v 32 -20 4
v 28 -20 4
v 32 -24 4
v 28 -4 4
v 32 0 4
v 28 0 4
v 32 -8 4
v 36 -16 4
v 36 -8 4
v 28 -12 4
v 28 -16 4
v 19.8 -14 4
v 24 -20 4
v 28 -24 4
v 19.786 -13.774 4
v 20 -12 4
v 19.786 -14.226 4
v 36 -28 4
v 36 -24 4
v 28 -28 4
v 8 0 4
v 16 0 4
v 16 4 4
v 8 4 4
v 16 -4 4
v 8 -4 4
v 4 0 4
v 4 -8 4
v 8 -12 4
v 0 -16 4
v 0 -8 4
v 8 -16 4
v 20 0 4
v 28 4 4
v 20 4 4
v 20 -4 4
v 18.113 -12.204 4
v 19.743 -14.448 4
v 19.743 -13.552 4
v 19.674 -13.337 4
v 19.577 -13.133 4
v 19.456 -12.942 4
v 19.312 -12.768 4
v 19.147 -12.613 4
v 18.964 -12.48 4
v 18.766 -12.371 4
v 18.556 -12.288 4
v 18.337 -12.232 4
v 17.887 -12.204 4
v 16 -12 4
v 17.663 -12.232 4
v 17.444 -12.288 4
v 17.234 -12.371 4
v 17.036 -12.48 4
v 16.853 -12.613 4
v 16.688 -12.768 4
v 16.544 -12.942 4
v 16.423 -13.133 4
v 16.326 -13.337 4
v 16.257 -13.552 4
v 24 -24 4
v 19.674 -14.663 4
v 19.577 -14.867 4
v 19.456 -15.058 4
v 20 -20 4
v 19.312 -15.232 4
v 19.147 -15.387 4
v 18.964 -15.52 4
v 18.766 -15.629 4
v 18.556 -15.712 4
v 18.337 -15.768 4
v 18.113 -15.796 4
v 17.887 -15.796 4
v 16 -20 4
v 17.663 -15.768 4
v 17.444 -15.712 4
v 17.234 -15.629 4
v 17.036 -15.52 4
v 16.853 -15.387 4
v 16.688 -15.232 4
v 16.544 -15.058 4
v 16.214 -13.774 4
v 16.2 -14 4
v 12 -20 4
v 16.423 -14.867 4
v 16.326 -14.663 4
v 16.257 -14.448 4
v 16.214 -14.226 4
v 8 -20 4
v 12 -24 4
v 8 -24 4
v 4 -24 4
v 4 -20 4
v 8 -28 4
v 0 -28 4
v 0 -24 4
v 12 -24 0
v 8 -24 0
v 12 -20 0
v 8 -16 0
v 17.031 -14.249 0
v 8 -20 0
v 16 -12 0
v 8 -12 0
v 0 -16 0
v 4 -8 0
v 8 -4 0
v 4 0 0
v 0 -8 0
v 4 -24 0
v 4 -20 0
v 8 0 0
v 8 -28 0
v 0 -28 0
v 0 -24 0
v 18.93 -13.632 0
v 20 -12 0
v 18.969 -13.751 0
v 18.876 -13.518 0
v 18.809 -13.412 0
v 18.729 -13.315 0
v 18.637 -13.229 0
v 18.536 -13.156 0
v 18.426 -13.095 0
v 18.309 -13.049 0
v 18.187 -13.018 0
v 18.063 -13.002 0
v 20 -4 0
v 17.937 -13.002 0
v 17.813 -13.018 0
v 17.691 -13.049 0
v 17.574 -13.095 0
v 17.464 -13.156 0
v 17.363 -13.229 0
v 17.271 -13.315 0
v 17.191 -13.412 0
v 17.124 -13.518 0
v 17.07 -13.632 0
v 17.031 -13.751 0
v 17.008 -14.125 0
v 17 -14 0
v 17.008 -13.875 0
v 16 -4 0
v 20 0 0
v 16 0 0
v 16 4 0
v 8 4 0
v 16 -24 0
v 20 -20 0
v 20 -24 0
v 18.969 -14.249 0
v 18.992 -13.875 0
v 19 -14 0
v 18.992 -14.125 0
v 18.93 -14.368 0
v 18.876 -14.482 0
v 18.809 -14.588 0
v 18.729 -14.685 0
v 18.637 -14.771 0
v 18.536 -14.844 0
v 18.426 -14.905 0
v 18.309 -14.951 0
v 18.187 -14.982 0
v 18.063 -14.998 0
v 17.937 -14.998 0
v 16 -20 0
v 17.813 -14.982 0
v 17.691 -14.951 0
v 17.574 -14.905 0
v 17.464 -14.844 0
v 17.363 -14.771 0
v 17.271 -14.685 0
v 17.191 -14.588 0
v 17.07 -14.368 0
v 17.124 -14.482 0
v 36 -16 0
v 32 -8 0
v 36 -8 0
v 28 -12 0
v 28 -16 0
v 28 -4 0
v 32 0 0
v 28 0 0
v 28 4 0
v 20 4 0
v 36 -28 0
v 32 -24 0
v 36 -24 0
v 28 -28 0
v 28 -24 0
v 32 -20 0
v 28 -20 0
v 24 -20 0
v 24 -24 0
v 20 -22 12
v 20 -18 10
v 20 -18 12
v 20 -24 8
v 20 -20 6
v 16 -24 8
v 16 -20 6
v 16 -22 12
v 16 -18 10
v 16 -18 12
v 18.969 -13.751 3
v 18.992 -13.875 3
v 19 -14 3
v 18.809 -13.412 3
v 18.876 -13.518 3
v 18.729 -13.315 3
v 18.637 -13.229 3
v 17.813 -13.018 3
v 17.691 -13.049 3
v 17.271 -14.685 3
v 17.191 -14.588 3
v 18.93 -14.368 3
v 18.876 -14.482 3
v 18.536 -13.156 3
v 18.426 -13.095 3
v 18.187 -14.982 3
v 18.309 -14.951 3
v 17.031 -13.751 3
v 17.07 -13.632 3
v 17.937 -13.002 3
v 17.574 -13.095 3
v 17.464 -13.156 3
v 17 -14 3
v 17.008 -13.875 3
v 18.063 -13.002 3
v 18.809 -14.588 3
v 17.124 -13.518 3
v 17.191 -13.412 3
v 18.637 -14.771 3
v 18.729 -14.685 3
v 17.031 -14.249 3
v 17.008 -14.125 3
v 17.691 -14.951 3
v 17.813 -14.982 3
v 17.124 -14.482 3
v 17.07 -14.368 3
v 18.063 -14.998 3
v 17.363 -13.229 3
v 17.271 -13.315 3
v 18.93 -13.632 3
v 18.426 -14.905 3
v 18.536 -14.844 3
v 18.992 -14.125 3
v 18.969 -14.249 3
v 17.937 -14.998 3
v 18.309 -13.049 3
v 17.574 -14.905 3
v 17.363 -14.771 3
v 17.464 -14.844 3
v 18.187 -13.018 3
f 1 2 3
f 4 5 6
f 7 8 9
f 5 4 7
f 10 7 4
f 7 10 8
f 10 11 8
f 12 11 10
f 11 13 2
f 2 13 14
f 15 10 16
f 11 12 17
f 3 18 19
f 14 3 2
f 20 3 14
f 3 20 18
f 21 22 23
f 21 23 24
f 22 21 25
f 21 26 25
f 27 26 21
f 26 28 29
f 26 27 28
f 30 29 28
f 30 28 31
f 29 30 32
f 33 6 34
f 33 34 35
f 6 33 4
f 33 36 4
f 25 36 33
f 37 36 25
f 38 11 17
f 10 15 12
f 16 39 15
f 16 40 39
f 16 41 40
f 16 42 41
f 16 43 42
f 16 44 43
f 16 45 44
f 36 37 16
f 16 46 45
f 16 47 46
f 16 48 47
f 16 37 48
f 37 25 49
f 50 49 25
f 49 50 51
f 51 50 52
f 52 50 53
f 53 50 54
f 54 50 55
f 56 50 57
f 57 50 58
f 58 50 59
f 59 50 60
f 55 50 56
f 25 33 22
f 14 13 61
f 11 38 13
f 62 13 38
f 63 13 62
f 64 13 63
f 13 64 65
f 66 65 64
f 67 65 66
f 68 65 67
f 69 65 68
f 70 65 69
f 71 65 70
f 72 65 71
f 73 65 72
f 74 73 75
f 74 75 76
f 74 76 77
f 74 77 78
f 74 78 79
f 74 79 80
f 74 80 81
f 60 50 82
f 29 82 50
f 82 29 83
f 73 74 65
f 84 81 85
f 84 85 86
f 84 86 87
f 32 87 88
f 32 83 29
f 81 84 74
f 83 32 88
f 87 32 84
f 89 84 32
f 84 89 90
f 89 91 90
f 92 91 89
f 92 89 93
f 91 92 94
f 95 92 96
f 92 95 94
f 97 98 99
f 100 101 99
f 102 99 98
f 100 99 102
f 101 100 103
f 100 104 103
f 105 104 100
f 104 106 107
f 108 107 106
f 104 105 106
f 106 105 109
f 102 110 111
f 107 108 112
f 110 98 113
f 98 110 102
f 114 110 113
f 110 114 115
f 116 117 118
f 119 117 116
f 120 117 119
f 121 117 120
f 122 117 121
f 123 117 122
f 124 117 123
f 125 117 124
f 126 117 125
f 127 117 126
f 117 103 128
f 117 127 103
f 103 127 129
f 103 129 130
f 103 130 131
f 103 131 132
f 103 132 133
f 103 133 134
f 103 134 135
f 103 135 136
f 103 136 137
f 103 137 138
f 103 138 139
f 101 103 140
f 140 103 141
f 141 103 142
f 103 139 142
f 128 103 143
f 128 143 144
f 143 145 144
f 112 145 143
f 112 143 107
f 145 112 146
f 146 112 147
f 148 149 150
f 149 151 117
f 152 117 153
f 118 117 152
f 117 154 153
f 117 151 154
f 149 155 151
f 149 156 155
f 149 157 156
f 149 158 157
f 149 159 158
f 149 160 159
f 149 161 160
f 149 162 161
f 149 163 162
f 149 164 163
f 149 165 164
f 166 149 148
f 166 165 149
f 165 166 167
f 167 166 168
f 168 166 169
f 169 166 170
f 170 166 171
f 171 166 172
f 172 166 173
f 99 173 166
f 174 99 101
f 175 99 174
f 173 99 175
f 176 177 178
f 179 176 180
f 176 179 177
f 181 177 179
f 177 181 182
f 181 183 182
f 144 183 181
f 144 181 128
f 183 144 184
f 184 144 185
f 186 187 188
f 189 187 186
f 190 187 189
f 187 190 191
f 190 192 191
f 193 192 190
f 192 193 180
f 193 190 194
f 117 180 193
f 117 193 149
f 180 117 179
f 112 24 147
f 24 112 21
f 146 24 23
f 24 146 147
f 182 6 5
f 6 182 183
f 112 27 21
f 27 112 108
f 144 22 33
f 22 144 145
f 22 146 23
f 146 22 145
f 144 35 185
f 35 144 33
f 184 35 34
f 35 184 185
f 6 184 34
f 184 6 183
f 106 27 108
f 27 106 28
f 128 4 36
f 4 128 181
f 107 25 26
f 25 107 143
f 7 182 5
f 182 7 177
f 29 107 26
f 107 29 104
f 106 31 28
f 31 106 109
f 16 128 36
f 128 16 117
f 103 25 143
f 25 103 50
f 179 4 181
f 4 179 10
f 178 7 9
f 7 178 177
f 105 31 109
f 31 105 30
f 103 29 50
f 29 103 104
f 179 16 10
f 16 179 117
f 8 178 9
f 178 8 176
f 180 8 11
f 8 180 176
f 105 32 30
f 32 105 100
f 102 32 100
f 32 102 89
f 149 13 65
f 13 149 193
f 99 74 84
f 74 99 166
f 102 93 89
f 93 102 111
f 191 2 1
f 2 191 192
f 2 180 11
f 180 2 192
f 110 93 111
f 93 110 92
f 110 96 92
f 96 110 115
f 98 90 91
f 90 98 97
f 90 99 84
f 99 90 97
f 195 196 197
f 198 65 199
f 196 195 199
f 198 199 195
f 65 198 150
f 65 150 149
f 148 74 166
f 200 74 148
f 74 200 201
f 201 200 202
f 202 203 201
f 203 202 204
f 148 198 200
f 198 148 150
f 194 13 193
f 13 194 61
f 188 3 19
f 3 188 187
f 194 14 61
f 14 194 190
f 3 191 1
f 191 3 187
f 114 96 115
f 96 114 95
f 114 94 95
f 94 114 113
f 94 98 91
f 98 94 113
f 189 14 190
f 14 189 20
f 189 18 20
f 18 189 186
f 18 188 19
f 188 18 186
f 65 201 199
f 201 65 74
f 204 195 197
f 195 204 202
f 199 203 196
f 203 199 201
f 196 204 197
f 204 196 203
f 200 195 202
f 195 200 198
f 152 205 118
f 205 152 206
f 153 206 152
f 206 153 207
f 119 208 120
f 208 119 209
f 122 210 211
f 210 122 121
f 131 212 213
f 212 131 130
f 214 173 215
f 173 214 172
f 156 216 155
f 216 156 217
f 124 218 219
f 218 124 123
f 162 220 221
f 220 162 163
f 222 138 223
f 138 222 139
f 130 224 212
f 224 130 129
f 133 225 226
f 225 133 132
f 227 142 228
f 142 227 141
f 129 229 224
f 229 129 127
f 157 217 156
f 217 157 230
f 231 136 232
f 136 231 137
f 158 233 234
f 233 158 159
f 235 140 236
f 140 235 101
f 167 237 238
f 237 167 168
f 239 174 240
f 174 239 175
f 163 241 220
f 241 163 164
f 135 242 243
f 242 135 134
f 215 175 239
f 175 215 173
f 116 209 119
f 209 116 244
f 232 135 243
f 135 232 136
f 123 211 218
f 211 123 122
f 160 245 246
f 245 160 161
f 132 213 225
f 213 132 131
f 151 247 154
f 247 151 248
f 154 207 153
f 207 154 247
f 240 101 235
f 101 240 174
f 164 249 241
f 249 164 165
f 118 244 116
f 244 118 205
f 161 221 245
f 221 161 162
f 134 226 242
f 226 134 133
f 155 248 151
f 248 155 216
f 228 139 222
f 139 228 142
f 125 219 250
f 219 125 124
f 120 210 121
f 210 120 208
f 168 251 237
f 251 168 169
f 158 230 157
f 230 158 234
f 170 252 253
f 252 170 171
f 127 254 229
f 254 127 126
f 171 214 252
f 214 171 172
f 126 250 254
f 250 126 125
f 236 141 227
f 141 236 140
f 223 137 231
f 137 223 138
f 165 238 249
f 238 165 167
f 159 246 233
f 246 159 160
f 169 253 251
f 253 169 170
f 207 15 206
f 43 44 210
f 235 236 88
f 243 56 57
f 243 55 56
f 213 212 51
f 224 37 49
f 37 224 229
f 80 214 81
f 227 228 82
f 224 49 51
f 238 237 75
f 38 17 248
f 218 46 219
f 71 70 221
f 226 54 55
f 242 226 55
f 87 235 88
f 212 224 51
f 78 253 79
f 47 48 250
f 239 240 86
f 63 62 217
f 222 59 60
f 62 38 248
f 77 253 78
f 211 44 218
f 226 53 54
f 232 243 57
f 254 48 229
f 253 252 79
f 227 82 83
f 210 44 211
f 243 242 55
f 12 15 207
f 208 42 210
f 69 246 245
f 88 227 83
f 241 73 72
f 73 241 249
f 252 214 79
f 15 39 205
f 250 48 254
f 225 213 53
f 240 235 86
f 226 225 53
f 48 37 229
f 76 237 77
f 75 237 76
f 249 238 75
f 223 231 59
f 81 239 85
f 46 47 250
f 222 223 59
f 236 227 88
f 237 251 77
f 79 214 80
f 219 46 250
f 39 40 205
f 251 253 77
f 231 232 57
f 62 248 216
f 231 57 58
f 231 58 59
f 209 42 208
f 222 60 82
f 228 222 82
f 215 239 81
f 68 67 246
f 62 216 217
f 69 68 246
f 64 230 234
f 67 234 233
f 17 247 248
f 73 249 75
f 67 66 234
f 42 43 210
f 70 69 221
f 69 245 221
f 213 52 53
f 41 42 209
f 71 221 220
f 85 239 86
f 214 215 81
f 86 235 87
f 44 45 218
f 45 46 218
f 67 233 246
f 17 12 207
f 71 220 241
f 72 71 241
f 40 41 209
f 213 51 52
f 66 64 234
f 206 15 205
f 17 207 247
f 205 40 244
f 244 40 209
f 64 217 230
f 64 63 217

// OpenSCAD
// [FL_INDEX: keywords="openscad, 3d_parametric, space_invader_hook, csg_solid" | COT="Parametric OpenSCAD design from 3DCodeverse"]
// Title: space invader hook

/* ********************************************************************
 * Space Invader Hooks
 * 
 * Generate your own cloth hooks. Tweak parameters, create your own
 * hooks or use the predefined modules.
 *
 * ******************************************************************** */

// preview[view:south, tilt:top]

// ------------------------------------------------------------------
// --- parameter ----------------------------------------------------
// ------------------------------------------------------------------

/* [Global] */



/* [Basic] */

// choose a space invader
spaceInvader = 5; // [1,2,3,4,5,6,7,8,9,10]

// pixel size
edgeLength = 4;

// thickness of the hook
strength = 4;

// radius of the hole
holeRadius = 1.0;

// adjust the strength of the connections of otherwise unconnected pixel
pixel_connection_strength = 0.4;


/* [Advanced] */

// resolution
$fn=50;

// make a hole or not
make_hole = "yes"; // [yes,no]

// make a hook or just the base space invader
make_hook = "yes"; // [yes,no]

// use to avoid loonely pixel
// minkowski_factor=10;



/* [Hidden] */

// ------------------------------------------------------------------
// --- space invader versions ---------------------------------------
// --- a vector of 2d coordinates; hole and hook position -----------
// ------------------------------------------------------------------

// space invader 1 parameter
si_1=[[0,0,1,0,1,0,0],[0,1,1,1,1,1,0],[0,1,0,1,0,1,0],[1,1,1,1,1,1,1],[1,0,1,0,1,0,1],[1,0,0,0,0,0,1]];
si_1_hole=[3,2];
si_1_hook=[3,4];

// space invader 2 parameter
si_2=[[0,0,1,0,1,0,0],[0,1,1,1,1,1,0],[0,1,0,1,0,1,0],[1,1,1,1,1,1,1],[1,0,1,1,1,0,1],[1,0,0,1,0,0,1]];
si_2_hole=[3,3];
si_2_hook=[3,5];

// space invader 3 parameter
si_3=[[0,0,1,0,1,0,0],[0,1,1,1,1,1,0],[0,1,0,1,0,1,0],[1,1,1,1,1,1,1],[1,0,1,1,1,0,1],[1,0,0,1,0,0,1],[0,0,0,1,0,0,0]];
si_3_hole=[3,3];
si_3_hook=[3,6];

// space invader 5 parameter
si_4=[[0,0,1,0,1,0,0],[0,1,1,1,1,1,0],[0,1,0,1,0,1,0],[1,1,1,1,1,1,1],[1,0,1,1,1,0,1],[1,0,0,1,0,0,1],[1,1,0,1,0,1,1]];
si_4_hole=[3,3];
si_4_hook=[3,6];

// space invader 5 parameter
si_5=[[0,0,1,1,0,1,1,0,0],[0,1,1,1,1,1,1,1,0],[0,1,0,0,1,0,0,1,0],[1,1,0,0,1,0,0,1,1],[1,1,1,1,1,1,1,1,1],[0,0,1,1,1,1,1,0,0],[0,1,1,0,1,0,1,1,0],[1,1,0,0,0,0,0,1,1]];
si_5_hole=[4,4];
si_5_hook=[4,6];

// space invader 6 parameter
si_6=[[0,0,1,0,0,0,0,0,1,0,0],[0,0,0,1,0,0,0,1,0,0,0],[0,0,1,1,1,1,1,1,1,0,0],[0,1,1,0,1,1,1,0,1,1,0],[1,1,1,1,1,1,1,1,1,1,1],[1,0,1,1,1,1,1,1,1,0,1],[1,0,1,0,0,0,0,0,1,0,1],[0,0,0,1,1,0,1,1,0,0,0]];
si_6_hole=[5,3];
si_6_hook=[5,5];
si_6_cons=[[0,0,2,0,0,0,0,0,0,0,0],[0,0,0,0,0,0,0,1,0,0,0],[0,0,0,0,0,0,0,0,0,0,0],[0,0,0,0,0,0,0,0,0,0,0],[0,0,0,0,0,0,0,0,0,0,0],[0,0,0,0,0,0,0,0,0,0,0],[0,0,2,0,0,0,0,0,0,0,0],[0,0,0,0,0,0,0,1,0,0,0]];

// space invader 7 parameter
si_7=[[0,0,0,1,1,0,0,0],[0,0,1,1,1,1,0,0],[0,1,1,1,1,1,1,0],[1,1,0,1,1,0,1,1],[1,1,1,1,1,1,1,1],[0,1,0,1,1,0,1,0],[1,0,0,0,0,0,0,1],[0,1,0,0,0,0,1,0]];
si_7_hole=[3.5,3];
si_7_hook=[3.5,5];
si_7_cons=[[0,0,0,0,0,0,0,0],[0,0,0,0,0,0,0,0],[0,0,0,0,0,0,0,0],[0,0,0,0,0,0,0,0],[0,0,0,0,0,0,0,0],[0,0,0,0,0,0,2,0],[3,0,0,0,0,0,0,0],[0,0,0,0,0,0,1,0]];

// space invader 8 parameter
si_8=[[0,0,0,1,1,0,0,0],[0,0,1,1,1,1,0,0],[0,1,1,1,1,1,1,0],[1,1,0,1,1,0,1,1],[1,1,1,1,1,1,1,1],[0,1,0,1,1,0,1,0],[1,0,1,0,0,1,0,1],[0,1,0,1,1,0,1,0]];
si_8_hole=[3.5,3];
si_8_hook=[3.5,5];
si_8_cons=[[0,0,0,0,0,0,0,0],[0,0,0,0,0,0,0,0],[0,0,0,0,0,0,0,0],[0,0,0,0,0,0,0,0],[0,0,0,0,0,0,0,0],[0,2,0,0,2,0,2,0],[3,0,3,0,0,3,0,0],[0,1,0,0,1,0,1,0]];

// space invader 9 parameter
si_9=[[0,0,0,0,1,1,1,1,0,0,0,0],[0,1,1,1,1,1,1,1,1,1,1,0],[1,1,1,1,1,1,1,1,1,1,1,1],[1,1,1,0,0,1,1,0,0,1,1,1],[1,1,1,1,1,1,1,1,1,1,1,1],[0,0,1,1,1,0,0,1,1,1,0,0],[0,1,1,0,0,1,1,0,0,1,1,0],[0,0,1,1,0,0,0,0,1,1,0,0]];
si_9_hole=[5.5,2];
si_9_hook=[5.5,4];
si_9_cons=[[0,0,0,0,0,0,0,0,0,0,0,0],[0,0,0,0,0,0,0,0,0,0,0,0],[0,0,0,0,0,0,0,0,0,0,0,0],[0,0,0,0,0,0,0,0,0,0,0,0],[0,0,0,0,0,0,0,0,0,0,0,0],[0,0,0,0,2,0,0,0,0,0,0,0],[0,0,0,0,0,0,1,0,0,0,0,0],[0,0,0,0,0,0,0,0,0,0,0,0]];

si_10=[[0,0,0,0,0,1,1,1,1,1,1,0,0,0,0,0],[0,0,0,1,1,1,1,1,1,1,1,1,1,0,0,0],[0,0,1,1,1,1,1,1,1,1,1,1,1,1,0,0],[0,1,1,0,1,1,0,1,1,0,1,1,0,1,1,0],[1,1,1,1,1,1,1,1,1,1,1,1,1,1,1,1],[0,0,1,1,1,0,0,1,1,0,0,1,1,1,0,0],[0,0,0,1,0,0,0,0,0,0,0,0,1,0,0,0]];
si_10_hole=[7.5,3];
si_10_hook=[7.5,5];
si_10_cons=[];




// ------------------------------------------------------------------
// --- programm -----------------------------------------------------
// ------------------------------------------------------------------

if (spaceInvader == 1) {
	complete_hook(si_1, [], si_1_hole, si_1_hook);
} else if (spaceInvader == 2) {
	complete_hook(si_2, [], si_2_hole, si_2_hook);
} else if (spaceInvader == 3) {
	complete_hook(si_3, [], si_3_hole, si_3_hook);
} else if (spaceInvader == 4) {
	complete_hook(si_4, [], si_4_hole, si_4_hook);
} else if (spaceInvader == 5) {
	complete_hook(si_5, [], si_5_hole, si_5_hook);
} else if (spaceInvader == 6) {
	complete_hook(si_6, si_6_cons, si_6_hole, si_6_hook);
} else if (spaceInvader == 7) {
	complete_hook(si_7, si_7_cons, si_7_hole, si_7_hook);
} else if (spaceInvader == 8) {
	complete_hook(si_8, si_8_cons, si_8_hole, si_8_hook);
} else if (spaceInvader == 9) {
	complete_hook(si_9, si_9_cons, si_9_hole, si_9_hook);
} else if (spaceInvader == 10) {
	complete_hook(si_10, si_10_cons, si_10_hole, si_10_hook);
}




// ------------------------------------------------------------------
// --- modules ------------------------------------------------------
// ------------------------------------------------------------------



module complete_hook(matrix, cons, hole, hook) {
	difference() {
		union() {
			hook_base(matrix);
			connections(cons);
			if (make_hook == "yes") {
				hook(hook[0], hook[1]);
			}
		}
		if (make_hole == "yes") {
			hook_hole_positive(hole[0], hole[1], 1);
		}
	}
}


module hook_base(data) {
	for (y = [0:len(data)]) {
		for(x = [0:len(data[y])]) {
			pixel(x,y,data[y][x]);
		}
	}
}

module connections(data) {
	for (y = [0:len(data)]) {
		for(x = [0:len(data[y])]) {
			if (data[y][x] > 0) {
				pixel_connection(x,y,data[y][x]);
			}
		}
	}
}

// builds a cube at specified position
//
module pixel(x, y, h) {
	translate([x*edgeLength, -y*edgeLength, 0]) {
		if (h > 0) {
			cube([edgeLength, edgeLength, strength*h]);
			/*
			minkowski()
			{
				cube([edgeLength, edgeLength, strength*h-(strength/5)]);
 				cylinder(r=strength/10,h=strength*h-(strength/5));
			}
			*/
		}
	}
}

// build a connection
module pixel_connection(x,y,direction) {
	translate([(x+0.5)*edgeLength,-(y-0.5)*edgeLength,0]) {
		if (direction == 3) {
			union() {
				hull() {
					cylinder(r=pixel_connection_strength, h=strength);
					translate([edgeLength,edgeLength,0]) {
						cylinder(r=pixel_connection_strength, h=strength);
					}
				}
				hull() {
					cylinder(r=pixel_connection_strength, h=strength);
					translate([edgeLength,-edgeLength,0]) {
						cylinder(r=pixel_connection_strength, h=strength);
					}
				}
			}
		}
		hull() {
			cylinder(r=pixel_connection_strength, h=strength);
			if (direction == 1) {
				translate([edgeLength,edgeLength,0]) {
					cylinder(r=pixel_connection_strength, h=strength);
				}
			}
			if (direction == 2) {
				translate([edgeLength,-edgeLength,0]) {
					cylinder(r=pixel_connection_strength, h=strength);
				}
			}
		}
	}
}

// make the positives for the holes
//
module hook_hole_positive(x,y,h) {
	translate([x*edgeLength+edgeLength/2, -y*edgeLength+edgeLength/2, 0]) {
		cylinder(h=strength*h, r=holeRadius);
		hull() {
			translate([0, 0, strength*h-holeRadius]) cylinder(h=0.1, r=holeRadius);
			translate([0, 0, strength*h]) cylinder(h=holeRadius/2, r=holeRadius*1.8);
		}
	}
}

// builds the hook at specified position
//
module hook(x, y) {
	translate([x*edgeLength, -y*edgeLength, 0]) {
		union() {
			cube([edgeLength, edgeLength, 0.5*edgeLength+strength]);
			hull() {
				translate([0, 0, 0.5*edgeLength+strength]) {
					cube([edgeLength, edgeLength, 0.5*edgeLength]);
				}
				translate([0, 0.5*edgeLength, 0.5*edgeLength+2*strength]) {
					cube([edgeLength, edgeLength, 0.5*edgeLength]);
				}
			}
		}
	}
}
